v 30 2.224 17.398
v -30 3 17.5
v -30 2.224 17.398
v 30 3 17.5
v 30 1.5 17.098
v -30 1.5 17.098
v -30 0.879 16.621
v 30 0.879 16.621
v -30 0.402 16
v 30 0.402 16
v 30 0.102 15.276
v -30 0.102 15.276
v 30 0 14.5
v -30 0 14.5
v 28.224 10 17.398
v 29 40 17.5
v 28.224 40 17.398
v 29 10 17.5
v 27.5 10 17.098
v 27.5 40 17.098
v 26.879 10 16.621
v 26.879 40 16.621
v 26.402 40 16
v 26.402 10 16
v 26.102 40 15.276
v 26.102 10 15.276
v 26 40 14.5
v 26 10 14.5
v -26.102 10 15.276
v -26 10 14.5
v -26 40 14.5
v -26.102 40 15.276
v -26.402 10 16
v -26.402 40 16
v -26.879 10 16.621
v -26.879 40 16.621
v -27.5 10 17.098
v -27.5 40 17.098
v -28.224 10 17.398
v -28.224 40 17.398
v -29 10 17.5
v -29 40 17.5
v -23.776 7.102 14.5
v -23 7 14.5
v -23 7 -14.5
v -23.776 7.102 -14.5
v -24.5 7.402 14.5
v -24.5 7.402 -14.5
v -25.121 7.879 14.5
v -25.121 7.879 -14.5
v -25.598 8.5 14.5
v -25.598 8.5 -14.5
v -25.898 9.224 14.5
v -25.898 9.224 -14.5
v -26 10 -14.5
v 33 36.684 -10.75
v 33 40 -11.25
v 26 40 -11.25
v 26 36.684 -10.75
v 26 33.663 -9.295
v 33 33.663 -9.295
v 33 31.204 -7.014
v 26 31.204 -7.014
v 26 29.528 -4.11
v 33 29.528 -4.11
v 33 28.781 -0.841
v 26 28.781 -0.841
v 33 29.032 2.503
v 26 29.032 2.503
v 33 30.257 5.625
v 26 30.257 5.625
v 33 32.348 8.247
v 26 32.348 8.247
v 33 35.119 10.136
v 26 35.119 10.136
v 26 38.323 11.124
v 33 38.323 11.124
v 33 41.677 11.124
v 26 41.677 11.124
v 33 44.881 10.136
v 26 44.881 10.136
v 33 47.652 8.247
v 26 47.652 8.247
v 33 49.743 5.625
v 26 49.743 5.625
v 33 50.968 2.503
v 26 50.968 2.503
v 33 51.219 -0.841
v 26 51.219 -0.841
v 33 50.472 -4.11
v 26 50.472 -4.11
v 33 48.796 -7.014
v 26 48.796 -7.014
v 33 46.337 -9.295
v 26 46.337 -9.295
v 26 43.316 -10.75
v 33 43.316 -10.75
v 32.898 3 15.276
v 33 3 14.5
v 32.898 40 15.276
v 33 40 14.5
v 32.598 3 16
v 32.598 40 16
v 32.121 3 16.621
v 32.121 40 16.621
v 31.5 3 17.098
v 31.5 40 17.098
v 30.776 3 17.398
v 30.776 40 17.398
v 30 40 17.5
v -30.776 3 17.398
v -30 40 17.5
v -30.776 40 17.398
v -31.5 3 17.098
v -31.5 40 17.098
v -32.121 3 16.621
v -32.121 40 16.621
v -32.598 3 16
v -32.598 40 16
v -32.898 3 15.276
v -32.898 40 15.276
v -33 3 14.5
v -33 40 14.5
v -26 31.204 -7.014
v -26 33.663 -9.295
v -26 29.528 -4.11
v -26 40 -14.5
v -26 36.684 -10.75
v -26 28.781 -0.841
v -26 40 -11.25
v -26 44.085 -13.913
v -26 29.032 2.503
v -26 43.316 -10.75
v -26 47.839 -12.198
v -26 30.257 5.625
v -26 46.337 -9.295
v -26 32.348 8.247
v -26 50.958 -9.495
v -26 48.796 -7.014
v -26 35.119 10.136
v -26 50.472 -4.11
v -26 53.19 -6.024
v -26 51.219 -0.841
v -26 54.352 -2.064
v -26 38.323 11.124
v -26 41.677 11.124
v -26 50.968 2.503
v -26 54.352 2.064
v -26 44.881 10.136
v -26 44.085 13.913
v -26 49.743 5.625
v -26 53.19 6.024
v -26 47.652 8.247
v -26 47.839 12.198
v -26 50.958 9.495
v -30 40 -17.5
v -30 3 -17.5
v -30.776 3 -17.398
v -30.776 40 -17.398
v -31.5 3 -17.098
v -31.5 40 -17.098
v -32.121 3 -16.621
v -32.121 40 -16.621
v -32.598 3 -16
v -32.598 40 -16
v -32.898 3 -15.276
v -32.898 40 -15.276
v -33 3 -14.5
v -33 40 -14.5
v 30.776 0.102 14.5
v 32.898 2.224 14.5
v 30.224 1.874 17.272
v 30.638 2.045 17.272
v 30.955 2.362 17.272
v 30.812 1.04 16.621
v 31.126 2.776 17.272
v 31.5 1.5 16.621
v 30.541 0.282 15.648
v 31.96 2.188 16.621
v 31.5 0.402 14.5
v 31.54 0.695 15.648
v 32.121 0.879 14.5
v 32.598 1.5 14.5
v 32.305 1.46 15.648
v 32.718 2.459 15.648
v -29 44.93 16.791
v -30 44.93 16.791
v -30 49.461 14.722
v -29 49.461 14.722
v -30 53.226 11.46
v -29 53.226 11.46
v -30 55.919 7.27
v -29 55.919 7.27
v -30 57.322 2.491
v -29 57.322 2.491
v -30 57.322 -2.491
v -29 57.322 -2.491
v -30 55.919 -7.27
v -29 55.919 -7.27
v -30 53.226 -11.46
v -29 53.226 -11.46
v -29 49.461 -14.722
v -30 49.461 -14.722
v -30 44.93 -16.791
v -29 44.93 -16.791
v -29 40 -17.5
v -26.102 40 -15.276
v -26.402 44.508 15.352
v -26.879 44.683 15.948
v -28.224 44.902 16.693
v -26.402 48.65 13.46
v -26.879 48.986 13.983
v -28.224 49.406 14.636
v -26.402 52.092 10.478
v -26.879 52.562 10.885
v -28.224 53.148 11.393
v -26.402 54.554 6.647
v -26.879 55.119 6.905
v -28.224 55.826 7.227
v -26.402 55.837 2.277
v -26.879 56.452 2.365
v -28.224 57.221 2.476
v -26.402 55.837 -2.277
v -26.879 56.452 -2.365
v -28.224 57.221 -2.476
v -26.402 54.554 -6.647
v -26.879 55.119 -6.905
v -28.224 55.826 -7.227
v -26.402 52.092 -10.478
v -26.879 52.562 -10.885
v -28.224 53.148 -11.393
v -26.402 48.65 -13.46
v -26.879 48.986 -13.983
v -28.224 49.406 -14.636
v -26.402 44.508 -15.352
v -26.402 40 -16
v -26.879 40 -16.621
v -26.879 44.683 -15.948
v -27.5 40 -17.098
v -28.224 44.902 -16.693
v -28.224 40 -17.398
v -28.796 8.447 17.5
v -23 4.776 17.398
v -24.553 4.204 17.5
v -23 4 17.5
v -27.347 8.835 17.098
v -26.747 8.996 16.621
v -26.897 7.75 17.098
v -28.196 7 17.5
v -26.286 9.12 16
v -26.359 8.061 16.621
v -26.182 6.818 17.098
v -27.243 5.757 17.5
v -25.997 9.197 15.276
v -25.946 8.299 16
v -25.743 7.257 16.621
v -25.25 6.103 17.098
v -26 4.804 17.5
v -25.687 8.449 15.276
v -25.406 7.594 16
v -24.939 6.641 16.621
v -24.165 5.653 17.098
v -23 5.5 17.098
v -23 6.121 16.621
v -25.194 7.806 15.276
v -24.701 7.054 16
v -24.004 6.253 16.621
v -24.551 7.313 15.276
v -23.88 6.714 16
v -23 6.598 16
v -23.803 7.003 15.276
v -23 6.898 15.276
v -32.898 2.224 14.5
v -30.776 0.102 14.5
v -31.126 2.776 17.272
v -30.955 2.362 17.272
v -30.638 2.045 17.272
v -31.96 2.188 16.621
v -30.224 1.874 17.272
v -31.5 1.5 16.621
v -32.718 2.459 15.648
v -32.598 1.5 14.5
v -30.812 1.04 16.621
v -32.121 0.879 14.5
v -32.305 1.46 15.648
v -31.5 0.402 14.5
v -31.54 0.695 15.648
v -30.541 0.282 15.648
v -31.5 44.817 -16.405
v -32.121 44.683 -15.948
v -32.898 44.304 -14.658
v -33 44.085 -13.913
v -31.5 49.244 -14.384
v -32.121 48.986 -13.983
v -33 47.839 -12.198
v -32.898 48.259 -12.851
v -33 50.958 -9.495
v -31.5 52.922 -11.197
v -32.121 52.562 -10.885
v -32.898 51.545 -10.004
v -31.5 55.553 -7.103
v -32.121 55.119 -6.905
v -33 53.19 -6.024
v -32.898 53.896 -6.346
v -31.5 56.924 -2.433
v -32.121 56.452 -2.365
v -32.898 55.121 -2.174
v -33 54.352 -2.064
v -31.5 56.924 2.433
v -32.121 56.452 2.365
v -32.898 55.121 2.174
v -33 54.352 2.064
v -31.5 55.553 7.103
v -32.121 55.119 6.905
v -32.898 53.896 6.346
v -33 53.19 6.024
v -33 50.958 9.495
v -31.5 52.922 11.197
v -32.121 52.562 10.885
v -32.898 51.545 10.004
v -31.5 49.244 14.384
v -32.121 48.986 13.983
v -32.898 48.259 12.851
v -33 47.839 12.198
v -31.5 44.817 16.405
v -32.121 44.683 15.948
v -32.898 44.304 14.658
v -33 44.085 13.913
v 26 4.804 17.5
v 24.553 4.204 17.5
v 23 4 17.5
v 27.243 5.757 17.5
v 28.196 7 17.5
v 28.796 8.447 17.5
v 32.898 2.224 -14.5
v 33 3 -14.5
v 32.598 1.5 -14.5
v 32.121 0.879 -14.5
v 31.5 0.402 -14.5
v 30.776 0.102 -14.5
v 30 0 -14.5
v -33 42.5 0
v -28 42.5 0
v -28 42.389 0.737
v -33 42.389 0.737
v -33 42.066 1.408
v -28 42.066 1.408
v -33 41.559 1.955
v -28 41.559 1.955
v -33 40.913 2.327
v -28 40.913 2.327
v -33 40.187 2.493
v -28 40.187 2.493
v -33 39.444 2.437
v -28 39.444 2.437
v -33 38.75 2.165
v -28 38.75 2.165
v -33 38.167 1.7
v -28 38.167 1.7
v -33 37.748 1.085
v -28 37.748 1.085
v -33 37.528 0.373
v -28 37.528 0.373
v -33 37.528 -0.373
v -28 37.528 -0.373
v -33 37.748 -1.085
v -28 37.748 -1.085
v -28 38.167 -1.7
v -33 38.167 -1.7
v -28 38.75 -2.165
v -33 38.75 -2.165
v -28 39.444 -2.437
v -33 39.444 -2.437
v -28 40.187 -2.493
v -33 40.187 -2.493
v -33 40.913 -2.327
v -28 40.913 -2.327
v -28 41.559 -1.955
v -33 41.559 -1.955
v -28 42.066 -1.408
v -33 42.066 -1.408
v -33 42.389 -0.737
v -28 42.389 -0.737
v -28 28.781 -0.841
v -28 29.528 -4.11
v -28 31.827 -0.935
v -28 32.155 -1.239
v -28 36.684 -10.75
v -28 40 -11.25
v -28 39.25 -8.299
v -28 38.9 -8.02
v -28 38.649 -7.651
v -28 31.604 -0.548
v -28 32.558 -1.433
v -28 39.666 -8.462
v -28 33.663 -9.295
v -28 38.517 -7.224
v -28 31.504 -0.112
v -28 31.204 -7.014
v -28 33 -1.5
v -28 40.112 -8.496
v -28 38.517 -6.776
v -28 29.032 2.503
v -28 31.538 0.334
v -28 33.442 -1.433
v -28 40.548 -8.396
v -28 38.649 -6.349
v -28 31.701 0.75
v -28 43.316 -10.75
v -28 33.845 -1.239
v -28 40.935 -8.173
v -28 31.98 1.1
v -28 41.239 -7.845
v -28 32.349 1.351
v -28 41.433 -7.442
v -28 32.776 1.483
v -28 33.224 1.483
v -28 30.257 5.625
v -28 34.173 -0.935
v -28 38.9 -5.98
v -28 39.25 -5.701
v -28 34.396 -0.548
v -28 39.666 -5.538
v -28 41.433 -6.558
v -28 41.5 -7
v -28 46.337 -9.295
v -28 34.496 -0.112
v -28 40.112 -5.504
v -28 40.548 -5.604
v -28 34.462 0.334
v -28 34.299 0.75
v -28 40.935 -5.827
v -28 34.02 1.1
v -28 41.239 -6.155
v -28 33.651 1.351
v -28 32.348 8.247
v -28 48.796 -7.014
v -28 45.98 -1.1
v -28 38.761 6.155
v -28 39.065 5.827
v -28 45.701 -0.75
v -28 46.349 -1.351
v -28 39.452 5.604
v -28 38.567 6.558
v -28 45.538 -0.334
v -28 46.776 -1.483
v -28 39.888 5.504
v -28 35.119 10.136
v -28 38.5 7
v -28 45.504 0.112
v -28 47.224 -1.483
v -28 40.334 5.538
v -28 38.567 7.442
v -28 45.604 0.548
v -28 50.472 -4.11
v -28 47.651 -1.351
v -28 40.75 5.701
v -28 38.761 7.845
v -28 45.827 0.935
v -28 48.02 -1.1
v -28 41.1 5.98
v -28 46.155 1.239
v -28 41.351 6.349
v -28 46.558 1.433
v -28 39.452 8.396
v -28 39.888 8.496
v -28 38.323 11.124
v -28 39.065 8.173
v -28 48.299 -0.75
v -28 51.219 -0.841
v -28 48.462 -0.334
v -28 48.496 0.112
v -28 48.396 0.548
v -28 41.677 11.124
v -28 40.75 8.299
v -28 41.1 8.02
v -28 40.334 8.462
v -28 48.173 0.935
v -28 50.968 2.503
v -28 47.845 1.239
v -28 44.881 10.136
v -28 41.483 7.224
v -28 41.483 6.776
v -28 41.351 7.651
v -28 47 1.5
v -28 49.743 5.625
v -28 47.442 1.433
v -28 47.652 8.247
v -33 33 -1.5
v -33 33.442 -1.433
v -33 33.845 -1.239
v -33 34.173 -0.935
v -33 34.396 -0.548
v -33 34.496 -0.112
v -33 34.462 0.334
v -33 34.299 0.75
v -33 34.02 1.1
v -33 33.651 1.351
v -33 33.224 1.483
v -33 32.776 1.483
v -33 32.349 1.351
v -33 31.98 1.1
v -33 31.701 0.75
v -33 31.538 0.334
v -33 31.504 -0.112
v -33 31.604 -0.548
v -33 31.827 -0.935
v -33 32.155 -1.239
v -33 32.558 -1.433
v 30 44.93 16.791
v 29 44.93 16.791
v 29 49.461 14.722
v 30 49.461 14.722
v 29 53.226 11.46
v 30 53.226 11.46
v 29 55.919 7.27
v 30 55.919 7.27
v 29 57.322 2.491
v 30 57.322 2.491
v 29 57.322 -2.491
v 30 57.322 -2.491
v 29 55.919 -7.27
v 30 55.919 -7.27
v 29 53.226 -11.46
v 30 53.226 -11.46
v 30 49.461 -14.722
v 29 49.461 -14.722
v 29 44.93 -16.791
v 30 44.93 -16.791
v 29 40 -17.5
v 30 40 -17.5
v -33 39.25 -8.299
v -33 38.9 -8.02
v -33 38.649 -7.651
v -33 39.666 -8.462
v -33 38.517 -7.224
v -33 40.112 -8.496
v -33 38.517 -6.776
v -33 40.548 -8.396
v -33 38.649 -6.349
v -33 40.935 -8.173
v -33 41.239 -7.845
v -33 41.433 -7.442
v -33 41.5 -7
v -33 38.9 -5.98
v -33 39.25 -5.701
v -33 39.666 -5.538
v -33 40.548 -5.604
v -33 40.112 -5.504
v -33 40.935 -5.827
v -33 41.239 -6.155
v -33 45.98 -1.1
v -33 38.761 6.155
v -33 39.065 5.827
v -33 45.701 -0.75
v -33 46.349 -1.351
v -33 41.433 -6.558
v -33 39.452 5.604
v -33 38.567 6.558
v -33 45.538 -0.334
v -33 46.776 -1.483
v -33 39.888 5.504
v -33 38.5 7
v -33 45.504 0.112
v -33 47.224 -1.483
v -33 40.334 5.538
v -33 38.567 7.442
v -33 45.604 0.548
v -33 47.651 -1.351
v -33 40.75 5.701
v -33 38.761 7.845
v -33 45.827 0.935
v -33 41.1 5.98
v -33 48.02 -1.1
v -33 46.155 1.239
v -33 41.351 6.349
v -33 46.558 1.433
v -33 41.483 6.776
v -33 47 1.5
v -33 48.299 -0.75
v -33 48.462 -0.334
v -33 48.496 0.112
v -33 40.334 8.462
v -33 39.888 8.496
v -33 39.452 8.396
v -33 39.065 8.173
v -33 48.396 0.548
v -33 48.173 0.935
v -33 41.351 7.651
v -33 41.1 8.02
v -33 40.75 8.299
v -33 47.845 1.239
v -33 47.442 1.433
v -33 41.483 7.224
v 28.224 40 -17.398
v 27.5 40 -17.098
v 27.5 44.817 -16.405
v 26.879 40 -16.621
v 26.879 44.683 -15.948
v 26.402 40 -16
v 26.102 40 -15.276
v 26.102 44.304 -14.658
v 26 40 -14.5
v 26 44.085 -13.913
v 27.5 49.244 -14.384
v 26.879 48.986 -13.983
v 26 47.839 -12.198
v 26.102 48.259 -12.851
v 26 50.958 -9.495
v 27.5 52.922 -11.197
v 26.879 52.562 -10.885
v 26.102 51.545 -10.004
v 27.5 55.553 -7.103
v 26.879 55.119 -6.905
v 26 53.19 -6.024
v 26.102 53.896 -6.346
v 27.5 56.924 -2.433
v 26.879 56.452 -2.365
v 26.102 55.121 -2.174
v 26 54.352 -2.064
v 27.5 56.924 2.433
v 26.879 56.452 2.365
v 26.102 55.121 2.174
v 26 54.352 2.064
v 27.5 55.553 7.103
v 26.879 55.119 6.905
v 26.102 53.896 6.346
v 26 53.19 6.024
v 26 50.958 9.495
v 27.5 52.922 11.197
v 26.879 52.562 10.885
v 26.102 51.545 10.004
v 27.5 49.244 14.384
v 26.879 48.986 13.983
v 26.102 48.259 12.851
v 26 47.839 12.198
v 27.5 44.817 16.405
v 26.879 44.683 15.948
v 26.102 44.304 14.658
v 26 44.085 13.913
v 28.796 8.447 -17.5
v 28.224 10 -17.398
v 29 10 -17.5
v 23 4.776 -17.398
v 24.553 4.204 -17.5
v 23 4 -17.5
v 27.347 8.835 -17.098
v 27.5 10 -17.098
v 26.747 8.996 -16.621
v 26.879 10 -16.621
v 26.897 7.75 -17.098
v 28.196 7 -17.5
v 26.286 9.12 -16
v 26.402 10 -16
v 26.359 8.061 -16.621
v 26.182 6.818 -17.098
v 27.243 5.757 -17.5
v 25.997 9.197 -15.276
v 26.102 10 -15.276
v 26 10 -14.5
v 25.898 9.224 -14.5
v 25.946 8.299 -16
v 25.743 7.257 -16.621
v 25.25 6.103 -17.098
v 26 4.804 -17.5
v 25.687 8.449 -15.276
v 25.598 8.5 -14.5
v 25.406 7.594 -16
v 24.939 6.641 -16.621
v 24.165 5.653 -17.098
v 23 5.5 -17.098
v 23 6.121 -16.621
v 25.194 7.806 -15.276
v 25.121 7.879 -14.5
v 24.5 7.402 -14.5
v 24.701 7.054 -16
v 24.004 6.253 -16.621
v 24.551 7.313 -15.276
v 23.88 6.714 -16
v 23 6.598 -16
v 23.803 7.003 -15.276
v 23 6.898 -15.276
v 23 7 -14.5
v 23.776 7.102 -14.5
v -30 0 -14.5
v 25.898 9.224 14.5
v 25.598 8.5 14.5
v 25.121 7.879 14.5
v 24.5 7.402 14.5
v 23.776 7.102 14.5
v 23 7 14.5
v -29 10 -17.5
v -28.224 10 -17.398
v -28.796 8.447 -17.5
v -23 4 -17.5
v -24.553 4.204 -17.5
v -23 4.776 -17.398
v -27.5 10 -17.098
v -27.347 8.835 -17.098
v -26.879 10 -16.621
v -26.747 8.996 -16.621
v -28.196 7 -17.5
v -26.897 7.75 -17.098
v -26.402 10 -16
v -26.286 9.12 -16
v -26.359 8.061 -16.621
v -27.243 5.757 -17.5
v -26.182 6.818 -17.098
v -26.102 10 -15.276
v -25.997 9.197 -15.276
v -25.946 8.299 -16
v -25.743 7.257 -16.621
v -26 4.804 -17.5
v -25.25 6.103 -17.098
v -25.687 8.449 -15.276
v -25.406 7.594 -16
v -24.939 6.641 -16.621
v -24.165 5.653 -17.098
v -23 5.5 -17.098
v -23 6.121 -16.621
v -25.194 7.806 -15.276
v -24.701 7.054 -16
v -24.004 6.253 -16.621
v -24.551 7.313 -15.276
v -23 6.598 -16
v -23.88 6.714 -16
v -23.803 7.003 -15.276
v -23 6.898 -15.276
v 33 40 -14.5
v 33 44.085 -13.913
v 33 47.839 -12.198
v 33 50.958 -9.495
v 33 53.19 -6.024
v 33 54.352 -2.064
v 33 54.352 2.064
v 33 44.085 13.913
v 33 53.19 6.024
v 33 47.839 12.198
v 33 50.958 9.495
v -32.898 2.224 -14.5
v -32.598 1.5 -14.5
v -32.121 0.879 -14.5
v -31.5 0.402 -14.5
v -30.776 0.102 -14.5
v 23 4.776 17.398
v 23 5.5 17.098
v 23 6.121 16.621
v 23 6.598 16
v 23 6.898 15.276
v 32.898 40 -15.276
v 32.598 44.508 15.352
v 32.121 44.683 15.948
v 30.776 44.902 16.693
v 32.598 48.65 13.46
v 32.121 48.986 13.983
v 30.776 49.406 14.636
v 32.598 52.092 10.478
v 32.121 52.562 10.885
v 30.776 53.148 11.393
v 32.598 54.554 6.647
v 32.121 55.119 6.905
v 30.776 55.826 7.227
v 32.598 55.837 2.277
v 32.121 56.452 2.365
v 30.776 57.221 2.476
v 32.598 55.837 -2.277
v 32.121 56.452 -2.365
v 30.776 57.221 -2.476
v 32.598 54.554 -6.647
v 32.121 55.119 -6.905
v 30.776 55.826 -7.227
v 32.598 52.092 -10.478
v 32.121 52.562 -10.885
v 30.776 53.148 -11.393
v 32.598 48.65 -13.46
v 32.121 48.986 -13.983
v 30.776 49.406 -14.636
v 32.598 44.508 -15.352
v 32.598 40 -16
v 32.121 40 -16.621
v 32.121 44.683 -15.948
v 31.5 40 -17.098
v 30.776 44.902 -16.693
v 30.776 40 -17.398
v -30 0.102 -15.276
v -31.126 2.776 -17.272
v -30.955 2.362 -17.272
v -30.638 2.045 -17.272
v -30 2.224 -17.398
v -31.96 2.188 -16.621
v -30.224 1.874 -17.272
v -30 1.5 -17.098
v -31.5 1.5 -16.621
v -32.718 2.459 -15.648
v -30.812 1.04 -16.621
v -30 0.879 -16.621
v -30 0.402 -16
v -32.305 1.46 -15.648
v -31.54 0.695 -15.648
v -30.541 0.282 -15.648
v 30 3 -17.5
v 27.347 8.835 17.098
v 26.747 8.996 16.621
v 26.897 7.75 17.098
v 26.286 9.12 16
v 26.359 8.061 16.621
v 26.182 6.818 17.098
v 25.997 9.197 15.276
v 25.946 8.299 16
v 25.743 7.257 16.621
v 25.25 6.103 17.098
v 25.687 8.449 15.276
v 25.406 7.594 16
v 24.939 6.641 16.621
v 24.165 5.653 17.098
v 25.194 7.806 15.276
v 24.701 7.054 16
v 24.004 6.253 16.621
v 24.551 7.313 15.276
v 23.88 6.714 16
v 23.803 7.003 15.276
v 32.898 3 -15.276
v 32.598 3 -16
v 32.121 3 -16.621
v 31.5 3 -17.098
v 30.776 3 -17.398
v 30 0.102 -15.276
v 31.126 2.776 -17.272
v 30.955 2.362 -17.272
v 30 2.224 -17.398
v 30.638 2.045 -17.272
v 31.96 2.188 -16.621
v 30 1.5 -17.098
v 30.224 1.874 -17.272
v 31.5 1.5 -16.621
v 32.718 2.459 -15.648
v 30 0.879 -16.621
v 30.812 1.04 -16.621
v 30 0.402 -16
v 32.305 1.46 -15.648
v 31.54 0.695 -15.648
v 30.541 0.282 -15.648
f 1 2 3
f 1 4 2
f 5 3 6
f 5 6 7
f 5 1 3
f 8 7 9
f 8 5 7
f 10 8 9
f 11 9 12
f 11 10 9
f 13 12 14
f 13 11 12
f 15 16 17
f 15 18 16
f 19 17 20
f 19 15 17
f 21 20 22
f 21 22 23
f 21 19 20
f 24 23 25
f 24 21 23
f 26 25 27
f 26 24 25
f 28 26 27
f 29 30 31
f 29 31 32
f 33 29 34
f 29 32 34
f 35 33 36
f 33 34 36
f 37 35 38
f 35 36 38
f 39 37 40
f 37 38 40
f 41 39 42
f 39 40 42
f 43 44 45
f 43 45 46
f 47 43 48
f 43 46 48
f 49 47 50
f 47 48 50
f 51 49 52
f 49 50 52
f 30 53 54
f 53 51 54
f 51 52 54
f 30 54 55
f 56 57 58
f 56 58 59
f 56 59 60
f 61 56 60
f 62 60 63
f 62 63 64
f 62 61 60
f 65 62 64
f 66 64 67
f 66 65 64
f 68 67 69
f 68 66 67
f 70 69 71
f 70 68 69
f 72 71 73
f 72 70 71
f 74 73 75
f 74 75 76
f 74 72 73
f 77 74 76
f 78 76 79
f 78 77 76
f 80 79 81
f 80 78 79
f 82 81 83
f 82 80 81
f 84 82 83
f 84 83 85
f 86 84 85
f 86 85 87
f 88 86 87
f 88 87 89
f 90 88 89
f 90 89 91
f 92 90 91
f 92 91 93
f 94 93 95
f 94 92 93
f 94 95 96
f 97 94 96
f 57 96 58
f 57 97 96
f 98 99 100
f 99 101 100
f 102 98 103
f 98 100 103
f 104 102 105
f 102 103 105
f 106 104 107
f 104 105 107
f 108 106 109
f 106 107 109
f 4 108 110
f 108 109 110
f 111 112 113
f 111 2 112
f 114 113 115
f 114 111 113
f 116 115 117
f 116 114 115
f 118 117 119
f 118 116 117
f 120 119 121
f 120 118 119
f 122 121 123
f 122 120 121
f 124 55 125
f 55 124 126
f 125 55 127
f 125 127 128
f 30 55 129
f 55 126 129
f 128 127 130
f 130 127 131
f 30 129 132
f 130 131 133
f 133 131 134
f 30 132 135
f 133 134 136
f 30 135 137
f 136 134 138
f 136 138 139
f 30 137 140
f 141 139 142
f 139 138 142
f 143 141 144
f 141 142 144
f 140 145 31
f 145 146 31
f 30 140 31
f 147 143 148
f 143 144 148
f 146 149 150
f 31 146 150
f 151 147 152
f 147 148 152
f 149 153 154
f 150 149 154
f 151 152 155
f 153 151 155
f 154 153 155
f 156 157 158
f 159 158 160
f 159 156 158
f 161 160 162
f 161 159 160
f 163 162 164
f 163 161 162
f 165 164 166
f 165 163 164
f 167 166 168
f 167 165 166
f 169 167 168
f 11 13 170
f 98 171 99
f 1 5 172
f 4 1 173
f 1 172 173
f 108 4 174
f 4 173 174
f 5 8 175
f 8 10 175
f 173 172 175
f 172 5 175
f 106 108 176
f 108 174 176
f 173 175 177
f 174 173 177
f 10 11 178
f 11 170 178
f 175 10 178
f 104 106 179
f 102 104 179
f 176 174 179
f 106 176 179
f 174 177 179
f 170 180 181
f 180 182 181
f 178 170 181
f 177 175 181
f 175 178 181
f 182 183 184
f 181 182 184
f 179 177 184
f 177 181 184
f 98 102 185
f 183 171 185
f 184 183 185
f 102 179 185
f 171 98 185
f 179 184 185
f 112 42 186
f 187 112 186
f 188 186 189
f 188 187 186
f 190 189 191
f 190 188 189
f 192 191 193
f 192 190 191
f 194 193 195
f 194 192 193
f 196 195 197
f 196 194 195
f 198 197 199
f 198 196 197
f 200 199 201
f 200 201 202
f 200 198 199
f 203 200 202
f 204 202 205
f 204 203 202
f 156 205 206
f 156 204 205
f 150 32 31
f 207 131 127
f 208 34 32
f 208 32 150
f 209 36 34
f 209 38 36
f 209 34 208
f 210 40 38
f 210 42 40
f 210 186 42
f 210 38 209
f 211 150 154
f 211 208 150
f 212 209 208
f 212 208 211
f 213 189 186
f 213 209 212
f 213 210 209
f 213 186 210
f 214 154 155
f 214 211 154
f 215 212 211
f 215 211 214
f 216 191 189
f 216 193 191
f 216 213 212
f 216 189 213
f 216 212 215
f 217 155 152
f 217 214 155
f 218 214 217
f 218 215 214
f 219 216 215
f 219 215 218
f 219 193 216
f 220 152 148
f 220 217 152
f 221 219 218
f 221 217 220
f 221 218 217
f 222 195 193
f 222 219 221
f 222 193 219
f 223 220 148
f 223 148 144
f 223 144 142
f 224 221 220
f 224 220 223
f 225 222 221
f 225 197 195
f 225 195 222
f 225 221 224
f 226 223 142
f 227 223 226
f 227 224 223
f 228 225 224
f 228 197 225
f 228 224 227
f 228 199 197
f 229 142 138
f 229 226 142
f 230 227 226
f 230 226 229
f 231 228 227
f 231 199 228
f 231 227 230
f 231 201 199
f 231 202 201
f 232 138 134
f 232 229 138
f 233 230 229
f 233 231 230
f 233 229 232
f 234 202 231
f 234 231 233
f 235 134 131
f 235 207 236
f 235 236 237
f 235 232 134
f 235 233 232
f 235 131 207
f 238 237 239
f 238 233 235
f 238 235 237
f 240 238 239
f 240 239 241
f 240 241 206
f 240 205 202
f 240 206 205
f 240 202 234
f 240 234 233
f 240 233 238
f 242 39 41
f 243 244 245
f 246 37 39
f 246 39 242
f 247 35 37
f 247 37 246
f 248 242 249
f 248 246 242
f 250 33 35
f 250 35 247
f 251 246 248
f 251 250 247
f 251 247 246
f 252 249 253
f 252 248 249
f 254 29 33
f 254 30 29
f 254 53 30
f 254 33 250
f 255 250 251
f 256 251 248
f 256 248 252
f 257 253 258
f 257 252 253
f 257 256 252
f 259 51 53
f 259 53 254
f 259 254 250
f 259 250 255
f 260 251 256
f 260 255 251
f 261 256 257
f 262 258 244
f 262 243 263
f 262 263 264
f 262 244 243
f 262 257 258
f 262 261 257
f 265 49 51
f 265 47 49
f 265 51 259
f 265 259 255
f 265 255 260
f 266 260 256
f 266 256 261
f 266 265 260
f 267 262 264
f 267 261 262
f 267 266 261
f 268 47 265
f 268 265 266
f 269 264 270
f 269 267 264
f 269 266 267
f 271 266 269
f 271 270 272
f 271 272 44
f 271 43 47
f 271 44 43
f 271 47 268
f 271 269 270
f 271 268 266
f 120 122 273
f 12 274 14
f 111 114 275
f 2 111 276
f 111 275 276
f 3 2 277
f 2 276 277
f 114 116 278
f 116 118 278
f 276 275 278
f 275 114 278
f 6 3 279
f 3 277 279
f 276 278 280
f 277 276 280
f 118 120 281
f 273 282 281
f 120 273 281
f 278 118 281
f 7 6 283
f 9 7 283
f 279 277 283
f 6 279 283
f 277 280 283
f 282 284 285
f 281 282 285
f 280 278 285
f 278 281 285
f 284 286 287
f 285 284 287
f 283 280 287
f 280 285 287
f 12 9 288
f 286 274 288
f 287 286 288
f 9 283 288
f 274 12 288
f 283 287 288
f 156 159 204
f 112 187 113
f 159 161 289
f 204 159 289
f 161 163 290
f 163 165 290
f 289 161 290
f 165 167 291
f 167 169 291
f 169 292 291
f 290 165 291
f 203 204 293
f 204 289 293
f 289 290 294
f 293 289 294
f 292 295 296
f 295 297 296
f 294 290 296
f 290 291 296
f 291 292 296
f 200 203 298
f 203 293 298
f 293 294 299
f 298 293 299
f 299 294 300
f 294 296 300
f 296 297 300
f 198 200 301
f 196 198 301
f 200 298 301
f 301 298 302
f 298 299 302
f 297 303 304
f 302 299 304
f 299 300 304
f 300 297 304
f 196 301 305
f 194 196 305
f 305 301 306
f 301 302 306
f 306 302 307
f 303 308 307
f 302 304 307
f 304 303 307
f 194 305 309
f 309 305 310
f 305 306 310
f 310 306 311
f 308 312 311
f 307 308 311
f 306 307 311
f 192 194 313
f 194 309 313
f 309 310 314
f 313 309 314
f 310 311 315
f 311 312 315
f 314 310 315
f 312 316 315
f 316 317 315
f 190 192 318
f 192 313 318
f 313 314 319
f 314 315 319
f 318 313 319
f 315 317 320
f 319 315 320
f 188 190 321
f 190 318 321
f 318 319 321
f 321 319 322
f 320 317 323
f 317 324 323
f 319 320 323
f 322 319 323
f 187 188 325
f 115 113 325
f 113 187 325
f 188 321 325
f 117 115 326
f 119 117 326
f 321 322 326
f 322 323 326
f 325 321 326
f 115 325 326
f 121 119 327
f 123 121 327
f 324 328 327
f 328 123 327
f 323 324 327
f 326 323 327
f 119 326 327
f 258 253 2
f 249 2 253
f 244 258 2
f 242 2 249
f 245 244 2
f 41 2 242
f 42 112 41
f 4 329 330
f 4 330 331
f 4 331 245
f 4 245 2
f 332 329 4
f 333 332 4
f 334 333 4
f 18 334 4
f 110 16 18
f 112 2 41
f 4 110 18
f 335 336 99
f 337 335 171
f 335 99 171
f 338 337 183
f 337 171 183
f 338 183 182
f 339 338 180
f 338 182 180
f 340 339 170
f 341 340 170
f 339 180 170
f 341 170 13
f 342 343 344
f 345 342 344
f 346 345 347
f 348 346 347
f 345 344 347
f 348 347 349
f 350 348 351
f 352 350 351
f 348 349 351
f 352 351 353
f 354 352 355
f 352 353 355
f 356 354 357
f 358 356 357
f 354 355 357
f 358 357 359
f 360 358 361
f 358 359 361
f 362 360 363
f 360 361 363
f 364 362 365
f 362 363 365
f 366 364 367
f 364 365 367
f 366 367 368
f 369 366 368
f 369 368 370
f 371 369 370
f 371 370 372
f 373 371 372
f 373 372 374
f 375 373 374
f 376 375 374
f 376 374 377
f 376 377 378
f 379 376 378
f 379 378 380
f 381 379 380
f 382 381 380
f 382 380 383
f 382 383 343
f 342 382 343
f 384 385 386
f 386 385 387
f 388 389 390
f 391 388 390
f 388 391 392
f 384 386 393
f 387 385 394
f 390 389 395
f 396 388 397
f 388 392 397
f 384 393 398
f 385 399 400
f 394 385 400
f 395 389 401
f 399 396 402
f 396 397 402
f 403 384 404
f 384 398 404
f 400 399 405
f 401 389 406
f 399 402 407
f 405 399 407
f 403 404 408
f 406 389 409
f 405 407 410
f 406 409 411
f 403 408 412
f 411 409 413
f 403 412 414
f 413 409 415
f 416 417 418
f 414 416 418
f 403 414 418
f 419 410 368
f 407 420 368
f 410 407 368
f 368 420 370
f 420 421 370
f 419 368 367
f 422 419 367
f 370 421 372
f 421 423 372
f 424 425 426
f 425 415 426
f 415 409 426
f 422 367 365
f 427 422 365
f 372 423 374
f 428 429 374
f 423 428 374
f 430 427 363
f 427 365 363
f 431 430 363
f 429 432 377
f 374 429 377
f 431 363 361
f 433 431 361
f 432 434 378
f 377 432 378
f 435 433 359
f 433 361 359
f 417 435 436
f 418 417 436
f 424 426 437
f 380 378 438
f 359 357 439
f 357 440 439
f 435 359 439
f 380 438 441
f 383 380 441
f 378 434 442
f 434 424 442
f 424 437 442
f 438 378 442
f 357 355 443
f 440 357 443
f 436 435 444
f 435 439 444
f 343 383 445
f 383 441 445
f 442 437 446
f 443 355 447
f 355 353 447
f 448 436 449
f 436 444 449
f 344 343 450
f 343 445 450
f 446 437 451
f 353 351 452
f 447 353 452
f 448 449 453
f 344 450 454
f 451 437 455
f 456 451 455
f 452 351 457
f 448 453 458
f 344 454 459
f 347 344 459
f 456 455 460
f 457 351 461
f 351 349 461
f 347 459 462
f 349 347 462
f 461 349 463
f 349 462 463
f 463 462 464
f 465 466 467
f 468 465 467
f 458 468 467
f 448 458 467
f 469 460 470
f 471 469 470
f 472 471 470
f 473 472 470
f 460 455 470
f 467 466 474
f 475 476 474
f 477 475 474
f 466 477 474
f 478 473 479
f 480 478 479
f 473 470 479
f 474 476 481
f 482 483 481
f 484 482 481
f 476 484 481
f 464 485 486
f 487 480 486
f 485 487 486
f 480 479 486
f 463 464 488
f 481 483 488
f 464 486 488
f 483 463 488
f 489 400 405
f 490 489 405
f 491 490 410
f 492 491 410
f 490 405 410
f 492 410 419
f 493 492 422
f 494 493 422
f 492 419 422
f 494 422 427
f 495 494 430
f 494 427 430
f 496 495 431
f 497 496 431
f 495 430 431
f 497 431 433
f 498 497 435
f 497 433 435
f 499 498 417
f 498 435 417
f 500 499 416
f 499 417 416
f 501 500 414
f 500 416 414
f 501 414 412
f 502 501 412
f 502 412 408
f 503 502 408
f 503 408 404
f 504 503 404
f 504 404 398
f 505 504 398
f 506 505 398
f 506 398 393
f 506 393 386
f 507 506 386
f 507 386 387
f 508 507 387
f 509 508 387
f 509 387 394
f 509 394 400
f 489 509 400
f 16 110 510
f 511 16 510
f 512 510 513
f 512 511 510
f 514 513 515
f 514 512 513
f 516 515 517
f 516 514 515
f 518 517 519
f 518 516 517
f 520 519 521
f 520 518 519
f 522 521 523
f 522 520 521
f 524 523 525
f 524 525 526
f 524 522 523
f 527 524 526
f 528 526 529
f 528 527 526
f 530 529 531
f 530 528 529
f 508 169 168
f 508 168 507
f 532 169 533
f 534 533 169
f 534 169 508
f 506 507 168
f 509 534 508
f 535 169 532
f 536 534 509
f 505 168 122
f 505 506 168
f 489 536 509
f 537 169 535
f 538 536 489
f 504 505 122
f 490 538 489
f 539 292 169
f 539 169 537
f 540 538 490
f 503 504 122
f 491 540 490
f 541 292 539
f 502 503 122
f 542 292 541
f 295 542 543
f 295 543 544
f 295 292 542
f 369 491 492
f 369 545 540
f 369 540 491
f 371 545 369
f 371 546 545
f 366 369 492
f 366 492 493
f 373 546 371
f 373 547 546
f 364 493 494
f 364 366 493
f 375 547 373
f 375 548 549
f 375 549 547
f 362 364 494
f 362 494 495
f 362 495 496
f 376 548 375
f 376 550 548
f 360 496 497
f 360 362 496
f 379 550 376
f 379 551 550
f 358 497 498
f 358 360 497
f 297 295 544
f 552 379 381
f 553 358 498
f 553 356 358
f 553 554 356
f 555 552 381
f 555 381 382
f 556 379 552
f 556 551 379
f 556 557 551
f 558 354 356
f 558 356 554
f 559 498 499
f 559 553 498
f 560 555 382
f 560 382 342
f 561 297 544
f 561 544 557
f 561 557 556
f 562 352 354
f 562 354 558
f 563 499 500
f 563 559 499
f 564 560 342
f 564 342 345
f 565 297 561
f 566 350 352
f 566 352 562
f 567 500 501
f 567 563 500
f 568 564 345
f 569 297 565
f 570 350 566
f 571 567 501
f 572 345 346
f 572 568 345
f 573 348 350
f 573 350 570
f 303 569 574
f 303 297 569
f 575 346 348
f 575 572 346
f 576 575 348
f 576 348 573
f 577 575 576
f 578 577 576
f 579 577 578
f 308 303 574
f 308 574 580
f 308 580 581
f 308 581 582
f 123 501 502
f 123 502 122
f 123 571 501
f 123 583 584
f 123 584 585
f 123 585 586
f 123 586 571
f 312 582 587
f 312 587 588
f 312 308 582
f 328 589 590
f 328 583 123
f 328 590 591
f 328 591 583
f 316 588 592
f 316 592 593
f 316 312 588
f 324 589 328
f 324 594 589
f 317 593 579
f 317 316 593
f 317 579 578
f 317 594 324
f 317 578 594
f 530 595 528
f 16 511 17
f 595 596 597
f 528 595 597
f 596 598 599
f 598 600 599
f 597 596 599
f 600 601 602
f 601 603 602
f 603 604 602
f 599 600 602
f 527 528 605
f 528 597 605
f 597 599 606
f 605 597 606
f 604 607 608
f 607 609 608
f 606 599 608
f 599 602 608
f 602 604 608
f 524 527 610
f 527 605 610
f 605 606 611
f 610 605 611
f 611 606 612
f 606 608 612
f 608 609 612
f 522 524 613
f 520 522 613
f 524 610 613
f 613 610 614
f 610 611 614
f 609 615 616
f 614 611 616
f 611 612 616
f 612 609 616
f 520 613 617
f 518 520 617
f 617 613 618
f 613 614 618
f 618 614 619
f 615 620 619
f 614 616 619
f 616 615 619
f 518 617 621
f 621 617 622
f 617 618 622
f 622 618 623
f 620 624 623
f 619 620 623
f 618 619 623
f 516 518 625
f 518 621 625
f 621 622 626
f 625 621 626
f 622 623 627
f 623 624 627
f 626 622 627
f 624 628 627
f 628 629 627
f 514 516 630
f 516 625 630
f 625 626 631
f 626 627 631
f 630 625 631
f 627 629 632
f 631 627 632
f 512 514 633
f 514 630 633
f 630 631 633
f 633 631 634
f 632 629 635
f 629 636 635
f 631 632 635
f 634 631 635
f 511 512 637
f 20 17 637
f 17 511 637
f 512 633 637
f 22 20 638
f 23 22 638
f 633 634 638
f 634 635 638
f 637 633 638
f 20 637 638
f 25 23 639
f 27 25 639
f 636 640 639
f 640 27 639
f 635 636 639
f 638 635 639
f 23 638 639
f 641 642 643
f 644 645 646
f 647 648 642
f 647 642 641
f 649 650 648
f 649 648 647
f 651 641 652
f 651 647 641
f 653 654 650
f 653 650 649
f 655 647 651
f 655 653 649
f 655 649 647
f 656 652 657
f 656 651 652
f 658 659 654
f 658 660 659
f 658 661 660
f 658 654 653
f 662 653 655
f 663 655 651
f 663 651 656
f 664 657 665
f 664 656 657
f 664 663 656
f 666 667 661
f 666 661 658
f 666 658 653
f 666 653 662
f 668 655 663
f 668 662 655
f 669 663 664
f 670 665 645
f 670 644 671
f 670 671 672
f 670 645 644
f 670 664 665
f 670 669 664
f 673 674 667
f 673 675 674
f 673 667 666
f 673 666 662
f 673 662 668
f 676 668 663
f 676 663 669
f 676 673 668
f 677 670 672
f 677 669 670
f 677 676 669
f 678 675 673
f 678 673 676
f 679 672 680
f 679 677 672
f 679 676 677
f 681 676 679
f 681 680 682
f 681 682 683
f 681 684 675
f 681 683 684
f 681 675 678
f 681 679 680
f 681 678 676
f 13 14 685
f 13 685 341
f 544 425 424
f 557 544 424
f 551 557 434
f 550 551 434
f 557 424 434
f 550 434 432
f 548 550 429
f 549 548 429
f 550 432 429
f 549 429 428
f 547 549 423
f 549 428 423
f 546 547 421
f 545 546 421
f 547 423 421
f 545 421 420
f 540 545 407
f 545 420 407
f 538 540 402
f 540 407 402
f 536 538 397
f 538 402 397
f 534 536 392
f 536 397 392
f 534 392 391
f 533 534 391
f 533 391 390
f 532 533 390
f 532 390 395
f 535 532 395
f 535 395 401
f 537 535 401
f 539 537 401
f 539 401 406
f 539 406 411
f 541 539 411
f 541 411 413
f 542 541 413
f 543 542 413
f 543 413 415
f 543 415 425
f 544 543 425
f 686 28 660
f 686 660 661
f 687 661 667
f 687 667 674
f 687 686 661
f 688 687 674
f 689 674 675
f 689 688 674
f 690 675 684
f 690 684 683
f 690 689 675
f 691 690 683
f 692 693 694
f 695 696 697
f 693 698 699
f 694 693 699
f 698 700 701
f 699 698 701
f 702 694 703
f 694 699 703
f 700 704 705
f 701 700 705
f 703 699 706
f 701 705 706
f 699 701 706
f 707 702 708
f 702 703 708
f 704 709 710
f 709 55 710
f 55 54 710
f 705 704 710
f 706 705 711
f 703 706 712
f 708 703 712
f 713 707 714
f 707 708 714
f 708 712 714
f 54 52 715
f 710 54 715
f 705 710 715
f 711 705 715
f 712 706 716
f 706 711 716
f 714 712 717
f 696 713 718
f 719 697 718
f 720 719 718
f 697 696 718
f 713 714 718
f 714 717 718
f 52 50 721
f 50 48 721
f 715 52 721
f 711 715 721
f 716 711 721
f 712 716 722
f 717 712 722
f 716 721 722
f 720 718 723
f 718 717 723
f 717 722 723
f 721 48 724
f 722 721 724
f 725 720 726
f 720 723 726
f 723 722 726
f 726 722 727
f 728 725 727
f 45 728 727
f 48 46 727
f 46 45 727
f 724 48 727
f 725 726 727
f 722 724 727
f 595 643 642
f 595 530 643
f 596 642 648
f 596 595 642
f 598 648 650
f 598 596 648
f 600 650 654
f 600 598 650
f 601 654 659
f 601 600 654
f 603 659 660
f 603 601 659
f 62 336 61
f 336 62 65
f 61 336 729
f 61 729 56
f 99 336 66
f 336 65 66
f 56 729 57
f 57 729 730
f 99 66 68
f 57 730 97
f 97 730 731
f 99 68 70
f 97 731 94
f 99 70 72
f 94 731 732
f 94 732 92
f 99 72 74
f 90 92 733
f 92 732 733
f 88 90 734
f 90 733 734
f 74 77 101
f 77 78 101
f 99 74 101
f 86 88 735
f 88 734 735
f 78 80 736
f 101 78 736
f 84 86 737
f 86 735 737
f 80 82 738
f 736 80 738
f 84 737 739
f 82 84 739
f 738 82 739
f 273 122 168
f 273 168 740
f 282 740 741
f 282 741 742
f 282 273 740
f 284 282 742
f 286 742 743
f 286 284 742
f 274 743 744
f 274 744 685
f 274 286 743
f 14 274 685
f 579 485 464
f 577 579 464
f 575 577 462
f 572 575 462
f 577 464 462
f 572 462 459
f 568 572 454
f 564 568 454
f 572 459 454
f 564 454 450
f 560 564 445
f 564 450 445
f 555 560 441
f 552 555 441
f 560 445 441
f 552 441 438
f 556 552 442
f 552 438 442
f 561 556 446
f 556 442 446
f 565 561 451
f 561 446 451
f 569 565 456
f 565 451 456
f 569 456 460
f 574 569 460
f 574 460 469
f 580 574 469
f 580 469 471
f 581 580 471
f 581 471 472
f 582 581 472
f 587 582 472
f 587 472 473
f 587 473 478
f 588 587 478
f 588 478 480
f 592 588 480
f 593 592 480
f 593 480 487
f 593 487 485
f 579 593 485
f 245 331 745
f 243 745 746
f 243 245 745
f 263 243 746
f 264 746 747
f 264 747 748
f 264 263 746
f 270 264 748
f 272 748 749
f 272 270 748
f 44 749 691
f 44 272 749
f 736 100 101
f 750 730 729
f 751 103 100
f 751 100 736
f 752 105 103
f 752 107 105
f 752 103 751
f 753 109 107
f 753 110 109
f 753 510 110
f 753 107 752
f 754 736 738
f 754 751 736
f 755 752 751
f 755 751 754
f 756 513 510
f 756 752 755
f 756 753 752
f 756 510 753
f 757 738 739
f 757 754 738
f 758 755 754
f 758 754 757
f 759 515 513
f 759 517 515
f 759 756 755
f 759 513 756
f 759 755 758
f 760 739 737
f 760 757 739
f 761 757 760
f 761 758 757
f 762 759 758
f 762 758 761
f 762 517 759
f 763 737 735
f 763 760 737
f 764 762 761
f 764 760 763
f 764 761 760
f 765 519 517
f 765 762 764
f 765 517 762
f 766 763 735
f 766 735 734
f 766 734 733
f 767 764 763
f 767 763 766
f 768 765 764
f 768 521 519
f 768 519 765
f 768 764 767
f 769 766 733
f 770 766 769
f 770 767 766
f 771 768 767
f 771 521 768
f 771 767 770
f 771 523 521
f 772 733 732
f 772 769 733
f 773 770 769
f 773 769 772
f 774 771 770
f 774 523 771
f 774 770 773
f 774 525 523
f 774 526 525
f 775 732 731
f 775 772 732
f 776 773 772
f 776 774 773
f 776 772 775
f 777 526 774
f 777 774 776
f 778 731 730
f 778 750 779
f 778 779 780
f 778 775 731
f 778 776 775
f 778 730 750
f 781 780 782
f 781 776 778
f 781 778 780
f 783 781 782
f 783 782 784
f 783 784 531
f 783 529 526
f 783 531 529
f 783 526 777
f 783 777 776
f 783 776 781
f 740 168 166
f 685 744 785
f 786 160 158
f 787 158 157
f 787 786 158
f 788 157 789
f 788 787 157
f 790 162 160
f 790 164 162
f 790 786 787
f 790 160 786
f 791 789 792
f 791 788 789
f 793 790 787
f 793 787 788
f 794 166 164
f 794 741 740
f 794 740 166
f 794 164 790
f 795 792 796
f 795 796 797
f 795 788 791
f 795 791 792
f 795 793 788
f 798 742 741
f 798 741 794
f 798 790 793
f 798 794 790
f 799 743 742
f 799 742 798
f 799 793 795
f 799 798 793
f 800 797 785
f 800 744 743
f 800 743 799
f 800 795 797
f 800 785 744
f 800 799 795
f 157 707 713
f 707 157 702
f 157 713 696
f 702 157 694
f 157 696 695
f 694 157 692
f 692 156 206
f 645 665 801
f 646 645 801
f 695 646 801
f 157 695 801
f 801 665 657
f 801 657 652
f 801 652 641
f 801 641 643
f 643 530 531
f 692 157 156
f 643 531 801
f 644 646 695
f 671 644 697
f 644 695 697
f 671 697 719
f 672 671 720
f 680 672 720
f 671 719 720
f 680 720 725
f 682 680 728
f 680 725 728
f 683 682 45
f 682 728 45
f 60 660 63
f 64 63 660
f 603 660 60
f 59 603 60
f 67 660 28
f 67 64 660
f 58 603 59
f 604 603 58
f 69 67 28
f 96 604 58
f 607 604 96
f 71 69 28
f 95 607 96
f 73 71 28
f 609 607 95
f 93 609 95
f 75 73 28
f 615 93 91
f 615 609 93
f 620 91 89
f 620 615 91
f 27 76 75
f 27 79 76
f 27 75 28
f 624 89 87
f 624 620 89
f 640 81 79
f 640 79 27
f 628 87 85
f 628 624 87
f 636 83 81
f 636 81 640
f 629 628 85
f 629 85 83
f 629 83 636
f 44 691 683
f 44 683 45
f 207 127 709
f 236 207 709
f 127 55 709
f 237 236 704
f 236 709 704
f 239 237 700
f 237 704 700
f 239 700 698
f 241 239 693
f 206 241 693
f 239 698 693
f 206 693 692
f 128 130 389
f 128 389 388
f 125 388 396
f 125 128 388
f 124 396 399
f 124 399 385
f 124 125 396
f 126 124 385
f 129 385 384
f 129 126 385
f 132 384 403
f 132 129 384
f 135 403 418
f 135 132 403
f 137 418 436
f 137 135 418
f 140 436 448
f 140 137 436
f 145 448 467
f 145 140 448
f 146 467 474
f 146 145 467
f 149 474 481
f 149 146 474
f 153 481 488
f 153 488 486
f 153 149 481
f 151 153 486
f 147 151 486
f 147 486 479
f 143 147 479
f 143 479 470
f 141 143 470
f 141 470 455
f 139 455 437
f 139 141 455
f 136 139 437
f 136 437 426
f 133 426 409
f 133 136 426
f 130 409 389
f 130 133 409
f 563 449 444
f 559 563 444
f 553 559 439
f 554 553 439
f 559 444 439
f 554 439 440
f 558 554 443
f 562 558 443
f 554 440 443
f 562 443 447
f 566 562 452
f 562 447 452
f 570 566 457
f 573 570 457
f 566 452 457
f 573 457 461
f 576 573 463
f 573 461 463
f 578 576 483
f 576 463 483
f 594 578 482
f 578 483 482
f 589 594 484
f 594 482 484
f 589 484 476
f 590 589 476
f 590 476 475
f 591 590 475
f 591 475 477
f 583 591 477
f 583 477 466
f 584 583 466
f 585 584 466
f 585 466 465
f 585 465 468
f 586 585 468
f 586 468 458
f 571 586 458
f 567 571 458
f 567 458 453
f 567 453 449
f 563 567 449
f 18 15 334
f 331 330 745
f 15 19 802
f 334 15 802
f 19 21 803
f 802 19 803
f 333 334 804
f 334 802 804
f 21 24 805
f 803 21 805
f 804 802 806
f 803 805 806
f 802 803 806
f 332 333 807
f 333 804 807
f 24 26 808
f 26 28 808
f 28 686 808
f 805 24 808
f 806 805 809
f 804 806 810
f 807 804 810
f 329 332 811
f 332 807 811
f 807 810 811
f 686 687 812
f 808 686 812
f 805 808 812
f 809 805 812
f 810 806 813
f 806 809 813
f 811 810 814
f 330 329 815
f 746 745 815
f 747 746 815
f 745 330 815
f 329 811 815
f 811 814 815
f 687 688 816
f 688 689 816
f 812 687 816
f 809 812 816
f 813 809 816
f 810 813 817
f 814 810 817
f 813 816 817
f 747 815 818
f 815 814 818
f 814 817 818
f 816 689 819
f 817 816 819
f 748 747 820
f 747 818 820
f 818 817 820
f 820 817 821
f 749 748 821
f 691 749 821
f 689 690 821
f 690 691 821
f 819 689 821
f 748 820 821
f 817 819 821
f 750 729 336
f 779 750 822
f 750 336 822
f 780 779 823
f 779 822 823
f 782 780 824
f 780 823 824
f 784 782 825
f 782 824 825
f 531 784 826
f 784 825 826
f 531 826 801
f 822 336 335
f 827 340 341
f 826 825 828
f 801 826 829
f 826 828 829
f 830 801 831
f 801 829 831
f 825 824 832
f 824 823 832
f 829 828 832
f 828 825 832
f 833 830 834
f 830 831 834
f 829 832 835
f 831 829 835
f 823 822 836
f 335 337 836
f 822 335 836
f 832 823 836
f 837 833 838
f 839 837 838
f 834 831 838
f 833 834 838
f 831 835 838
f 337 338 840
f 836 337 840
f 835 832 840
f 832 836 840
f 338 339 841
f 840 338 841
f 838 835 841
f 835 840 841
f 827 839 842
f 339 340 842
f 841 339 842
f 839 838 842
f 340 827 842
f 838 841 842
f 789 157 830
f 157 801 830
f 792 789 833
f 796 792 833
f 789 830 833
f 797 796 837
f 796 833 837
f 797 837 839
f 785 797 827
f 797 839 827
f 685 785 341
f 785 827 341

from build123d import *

# Parameters (mm, degrees)
EXTRUDE_THIN1_DEPTH = 17.5
BOSS_EXTRUDE2_DEPTH = 7
BOSS_EXTRUDE3_START = -59
BOSS_EXTRUDE3_DEPTH = 7
FILLET1_R           = 3
CUT_EXTRUDE1_START  = -7
CUT_EXTRUDE1_DEPTH  = 2
CUT_EXTRUDE2_START  = -66
CUT_EXTRUDE2_DEPTH  = 7
CUT_EXTRUDE3_REACH  = 87.636
SKETCH4_R           = 2.5
CUT_EXTRUDE4_REACH  = 87.636
SKETCH4_3_R         = 1.5
CIRPATTERN1_COUNT   = 4


with BuildPart() as part:
    # Sketch2 → Extrude-Thin1 (new, symmetric)
    with BuildSketch(Plane.XY):
        Polygon((-33, 40), (-33, 0), (33, 0), (33, 40), (26, 40), (26, 7), (-26, 7), (-26, 40), align=None)
    extrude(amount=EXTRUDE_THIN1_DEPTH, both=True)

    # Sketch3 → Boss-Extrude2 (add)
    with BuildSketch(Plane.ZY.offset(33)):
        with BuildLine():
            Line((11.25, 40), (17.5, 40))
            ThreePointArc((17.5, 40), (0, 57.5), (-17.5, 40))
            Line((-17.5, 40), (-11.25, 40))
            ThreePointArc((-11.25, 40), (0, 51.25), (11.25, 40))
        make_face()
        with BuildLine():
            ThreePointArc((-17.5, 40), (0, 22.5), (17.5, 40))
            Line((17.5, 40), (11.25, 40))
            ThreePointArc((11.25, 40), (0, 28.75), (-11.25, 40))
            Line((-11.25, 40), (-17.5, 40))
        make_face()
        with BuildLine():
            Line((-11.25, 40), (11.25, 40))
            ThreePointArc((11.25, 40), (0, 51.25), (-11.25, 40))
        make_face()
        with BuildLine():
            ThreePointArc((-11.25, 40), (0, 28.75), (11.25, 40))
            Line((11.25, 40), (-11.25, 40))
        make_face()
    extrude(amount=-BOSS_EXTRUDE2_DEPTH)

    # Sketch3<3> → Boss-Extrude3 (add)
    with BuildSketch(Plane.ZY.offset(33).offset(BOSS_EXTRUDE3_START)):
        with BuildLine():
            Line((-11.25, 40), (11.25, 40))
            ThreePointArc((11.25, 40), (0, 51.25), (-11.25, 40))
        make_face()
        with BuildLine():
            ThreePointArc((-11.25, 40), (0, 28.75), (11.25, 40))
            Line((11.25, 40), (-11.25, 40))
        make_face()
        with BuildLine():
            Line((11.25, 40), (17.5, 40))
            ThreePointArc((17.5, 40), (0, 57.5), (-17.5, 40))
            Line((-17.5, 40), (-11.25, 40))
            ThreePointArc((-11.25, 40), (0, 51.25), (11.25, 40))
        make_face()
        with BuildLine():
            ThreePointArc((-17.5, 40), (0, 22.5), (17.5, 40))
            Line((17.5, 40), (11.25, 40))
            ThreePointArc((11.25, 40), (0, 28.75), (-11.25, 40))
            Line((-11.25, 40), (-17.5, 40))
        make_face()
    extrude(amount=-BOSS_EXTRUDE3_DEPTH)

    # Fillet1
    fillet1_edges = [part.edges().sort_by_distance(p)[0] for p in [
        (-26, 7, 0),
        (26, 7, 0),
        (33, 0, 0),
        (-33, 0, 0),
        (-33, 20, 17.5),
        (0, 0, 17.5),
        (33, 20, 17.5),
        (-33, 57.5, 0),
        (-26, 57.5, 0),
        (26, 23.5, 17.5),
        (33, 57.5, 0),
        (26, 57.5, 0),
        (0, 7, 17.5),
        (-26, 23.5, 17.5),
        (0, 7, -17.5),
        (26, 23.5, -17.5),
        (33, 20, -17.5),
        (0, 0, -17.5),
        (-33, 20, -17.5),
        (-26, 23.5, -17.5),
    ]]
    fillet(fillet1_edges, radius=FILLET1_R)

    # Sketch3<4> → Cut-Extrude1 (cut)
    with BuildSketch(Plane.ZY.offset(33).offset(CUT_EXTRUDE1_START)):
        with BuildLine():
            Line((-11.25, 40), (11.25, 40))
            ThreePointArc((11.25, 40), (0, 51.25), (-11.25, 40))
        make_face()
        with BuildLine():
            ThreePointArc((-11.25, 40), (0, 28.75), (11.25, 40))
            Line((11.25, 40), (-11.25, 40))
        make_face()
    extrude(amount=CUT_EXTRUDE1_DEPTH, mode=Mode.SUBTRACT)

    # Sketch3<5> → Cut-Extrude2 (cut)
    with BuildSketch(Plane.ZY.offset(33).offset(CUT_EXTRUDE2_START)):
        with BuildLine():
            Line((-11.25, 40), (11.25, 40))
            ThreePointArc((11.25, 40), (0, 51.25), (-11.25, 40))
        make_face()
        with BuildLine():
            ThreePointArc((-11.25, 40), (0, 28.75), (11.25, 40))
            Line((11.25, 40), (-11.25, 40))
        make_face()
    extrude(amount=CUT_EXTRUDE2_DEPTH, mode=Mode.SUBTRACT)

    # Sketch4 → Cut-Extrude3 (cut, up to next)
    with BuildSketch(Plane(origin=(-28, 0, 0), x_dir=(0, 0, -1), z_dir=(1, 0, 0)), mode=Mode.PRIVATE) as cut_extrude3_sk1:
        with Locations(Location((0, 40, 0), (0, 0, 90))):
            Circle(SKETCH4_R)
    cut_extrude3_tool1 = extrude(cut_extrude3_sk1.sketch, amount=-CUT_EXTRUDE3_REACH, mode=Mode.PRIVATE) & part.part
    add(cut_extrude3_tool1.solids().sort_by_distance((-28, 40, 0))[0], mode=Mode.SUBTRACT)

    # Sketch4<3> → Cut-Extrude4 (cut, up to next)
    with BuildSketch(Plane(origin=(-28, 0, 0), x_dir=(0, 0, -1), z_dir=(1, 0, 0)), mode=Mode.PRIVATE) as cut_extrude4_sk1:
        with Locations(Location((7, 40, 0), (0, 0, 90))):
            Circle(SKETCH4_3_R)
    cut_extrude4_tool1 = extrude(cut_extrude4_sk1.sketch, amount=-CUT_EXTRUDE4_REACH, mode=Mode.PRIVATE) & part.part
    cut_extrude4 = cut_extrude4_tool1.solids().sort_by_distance((-28, 40, -7))[0]
    add(cut_extrude4, mode=Mode.SUBTRACT)

    # CirPattern1: Cut-Extrude4 ×4 about axis
    cirpattern1_axis = Axis((0, 40, 0), (1, 0, 0))
    for i in range(1, CIRPATTERN1_COUNT):
        add(cut_extrude4.rotate(cirpattern1_axis, i * 360 / CIRPATTERN1_COUNT), mode=Mode.SUBTRACT)


solid = part.part
